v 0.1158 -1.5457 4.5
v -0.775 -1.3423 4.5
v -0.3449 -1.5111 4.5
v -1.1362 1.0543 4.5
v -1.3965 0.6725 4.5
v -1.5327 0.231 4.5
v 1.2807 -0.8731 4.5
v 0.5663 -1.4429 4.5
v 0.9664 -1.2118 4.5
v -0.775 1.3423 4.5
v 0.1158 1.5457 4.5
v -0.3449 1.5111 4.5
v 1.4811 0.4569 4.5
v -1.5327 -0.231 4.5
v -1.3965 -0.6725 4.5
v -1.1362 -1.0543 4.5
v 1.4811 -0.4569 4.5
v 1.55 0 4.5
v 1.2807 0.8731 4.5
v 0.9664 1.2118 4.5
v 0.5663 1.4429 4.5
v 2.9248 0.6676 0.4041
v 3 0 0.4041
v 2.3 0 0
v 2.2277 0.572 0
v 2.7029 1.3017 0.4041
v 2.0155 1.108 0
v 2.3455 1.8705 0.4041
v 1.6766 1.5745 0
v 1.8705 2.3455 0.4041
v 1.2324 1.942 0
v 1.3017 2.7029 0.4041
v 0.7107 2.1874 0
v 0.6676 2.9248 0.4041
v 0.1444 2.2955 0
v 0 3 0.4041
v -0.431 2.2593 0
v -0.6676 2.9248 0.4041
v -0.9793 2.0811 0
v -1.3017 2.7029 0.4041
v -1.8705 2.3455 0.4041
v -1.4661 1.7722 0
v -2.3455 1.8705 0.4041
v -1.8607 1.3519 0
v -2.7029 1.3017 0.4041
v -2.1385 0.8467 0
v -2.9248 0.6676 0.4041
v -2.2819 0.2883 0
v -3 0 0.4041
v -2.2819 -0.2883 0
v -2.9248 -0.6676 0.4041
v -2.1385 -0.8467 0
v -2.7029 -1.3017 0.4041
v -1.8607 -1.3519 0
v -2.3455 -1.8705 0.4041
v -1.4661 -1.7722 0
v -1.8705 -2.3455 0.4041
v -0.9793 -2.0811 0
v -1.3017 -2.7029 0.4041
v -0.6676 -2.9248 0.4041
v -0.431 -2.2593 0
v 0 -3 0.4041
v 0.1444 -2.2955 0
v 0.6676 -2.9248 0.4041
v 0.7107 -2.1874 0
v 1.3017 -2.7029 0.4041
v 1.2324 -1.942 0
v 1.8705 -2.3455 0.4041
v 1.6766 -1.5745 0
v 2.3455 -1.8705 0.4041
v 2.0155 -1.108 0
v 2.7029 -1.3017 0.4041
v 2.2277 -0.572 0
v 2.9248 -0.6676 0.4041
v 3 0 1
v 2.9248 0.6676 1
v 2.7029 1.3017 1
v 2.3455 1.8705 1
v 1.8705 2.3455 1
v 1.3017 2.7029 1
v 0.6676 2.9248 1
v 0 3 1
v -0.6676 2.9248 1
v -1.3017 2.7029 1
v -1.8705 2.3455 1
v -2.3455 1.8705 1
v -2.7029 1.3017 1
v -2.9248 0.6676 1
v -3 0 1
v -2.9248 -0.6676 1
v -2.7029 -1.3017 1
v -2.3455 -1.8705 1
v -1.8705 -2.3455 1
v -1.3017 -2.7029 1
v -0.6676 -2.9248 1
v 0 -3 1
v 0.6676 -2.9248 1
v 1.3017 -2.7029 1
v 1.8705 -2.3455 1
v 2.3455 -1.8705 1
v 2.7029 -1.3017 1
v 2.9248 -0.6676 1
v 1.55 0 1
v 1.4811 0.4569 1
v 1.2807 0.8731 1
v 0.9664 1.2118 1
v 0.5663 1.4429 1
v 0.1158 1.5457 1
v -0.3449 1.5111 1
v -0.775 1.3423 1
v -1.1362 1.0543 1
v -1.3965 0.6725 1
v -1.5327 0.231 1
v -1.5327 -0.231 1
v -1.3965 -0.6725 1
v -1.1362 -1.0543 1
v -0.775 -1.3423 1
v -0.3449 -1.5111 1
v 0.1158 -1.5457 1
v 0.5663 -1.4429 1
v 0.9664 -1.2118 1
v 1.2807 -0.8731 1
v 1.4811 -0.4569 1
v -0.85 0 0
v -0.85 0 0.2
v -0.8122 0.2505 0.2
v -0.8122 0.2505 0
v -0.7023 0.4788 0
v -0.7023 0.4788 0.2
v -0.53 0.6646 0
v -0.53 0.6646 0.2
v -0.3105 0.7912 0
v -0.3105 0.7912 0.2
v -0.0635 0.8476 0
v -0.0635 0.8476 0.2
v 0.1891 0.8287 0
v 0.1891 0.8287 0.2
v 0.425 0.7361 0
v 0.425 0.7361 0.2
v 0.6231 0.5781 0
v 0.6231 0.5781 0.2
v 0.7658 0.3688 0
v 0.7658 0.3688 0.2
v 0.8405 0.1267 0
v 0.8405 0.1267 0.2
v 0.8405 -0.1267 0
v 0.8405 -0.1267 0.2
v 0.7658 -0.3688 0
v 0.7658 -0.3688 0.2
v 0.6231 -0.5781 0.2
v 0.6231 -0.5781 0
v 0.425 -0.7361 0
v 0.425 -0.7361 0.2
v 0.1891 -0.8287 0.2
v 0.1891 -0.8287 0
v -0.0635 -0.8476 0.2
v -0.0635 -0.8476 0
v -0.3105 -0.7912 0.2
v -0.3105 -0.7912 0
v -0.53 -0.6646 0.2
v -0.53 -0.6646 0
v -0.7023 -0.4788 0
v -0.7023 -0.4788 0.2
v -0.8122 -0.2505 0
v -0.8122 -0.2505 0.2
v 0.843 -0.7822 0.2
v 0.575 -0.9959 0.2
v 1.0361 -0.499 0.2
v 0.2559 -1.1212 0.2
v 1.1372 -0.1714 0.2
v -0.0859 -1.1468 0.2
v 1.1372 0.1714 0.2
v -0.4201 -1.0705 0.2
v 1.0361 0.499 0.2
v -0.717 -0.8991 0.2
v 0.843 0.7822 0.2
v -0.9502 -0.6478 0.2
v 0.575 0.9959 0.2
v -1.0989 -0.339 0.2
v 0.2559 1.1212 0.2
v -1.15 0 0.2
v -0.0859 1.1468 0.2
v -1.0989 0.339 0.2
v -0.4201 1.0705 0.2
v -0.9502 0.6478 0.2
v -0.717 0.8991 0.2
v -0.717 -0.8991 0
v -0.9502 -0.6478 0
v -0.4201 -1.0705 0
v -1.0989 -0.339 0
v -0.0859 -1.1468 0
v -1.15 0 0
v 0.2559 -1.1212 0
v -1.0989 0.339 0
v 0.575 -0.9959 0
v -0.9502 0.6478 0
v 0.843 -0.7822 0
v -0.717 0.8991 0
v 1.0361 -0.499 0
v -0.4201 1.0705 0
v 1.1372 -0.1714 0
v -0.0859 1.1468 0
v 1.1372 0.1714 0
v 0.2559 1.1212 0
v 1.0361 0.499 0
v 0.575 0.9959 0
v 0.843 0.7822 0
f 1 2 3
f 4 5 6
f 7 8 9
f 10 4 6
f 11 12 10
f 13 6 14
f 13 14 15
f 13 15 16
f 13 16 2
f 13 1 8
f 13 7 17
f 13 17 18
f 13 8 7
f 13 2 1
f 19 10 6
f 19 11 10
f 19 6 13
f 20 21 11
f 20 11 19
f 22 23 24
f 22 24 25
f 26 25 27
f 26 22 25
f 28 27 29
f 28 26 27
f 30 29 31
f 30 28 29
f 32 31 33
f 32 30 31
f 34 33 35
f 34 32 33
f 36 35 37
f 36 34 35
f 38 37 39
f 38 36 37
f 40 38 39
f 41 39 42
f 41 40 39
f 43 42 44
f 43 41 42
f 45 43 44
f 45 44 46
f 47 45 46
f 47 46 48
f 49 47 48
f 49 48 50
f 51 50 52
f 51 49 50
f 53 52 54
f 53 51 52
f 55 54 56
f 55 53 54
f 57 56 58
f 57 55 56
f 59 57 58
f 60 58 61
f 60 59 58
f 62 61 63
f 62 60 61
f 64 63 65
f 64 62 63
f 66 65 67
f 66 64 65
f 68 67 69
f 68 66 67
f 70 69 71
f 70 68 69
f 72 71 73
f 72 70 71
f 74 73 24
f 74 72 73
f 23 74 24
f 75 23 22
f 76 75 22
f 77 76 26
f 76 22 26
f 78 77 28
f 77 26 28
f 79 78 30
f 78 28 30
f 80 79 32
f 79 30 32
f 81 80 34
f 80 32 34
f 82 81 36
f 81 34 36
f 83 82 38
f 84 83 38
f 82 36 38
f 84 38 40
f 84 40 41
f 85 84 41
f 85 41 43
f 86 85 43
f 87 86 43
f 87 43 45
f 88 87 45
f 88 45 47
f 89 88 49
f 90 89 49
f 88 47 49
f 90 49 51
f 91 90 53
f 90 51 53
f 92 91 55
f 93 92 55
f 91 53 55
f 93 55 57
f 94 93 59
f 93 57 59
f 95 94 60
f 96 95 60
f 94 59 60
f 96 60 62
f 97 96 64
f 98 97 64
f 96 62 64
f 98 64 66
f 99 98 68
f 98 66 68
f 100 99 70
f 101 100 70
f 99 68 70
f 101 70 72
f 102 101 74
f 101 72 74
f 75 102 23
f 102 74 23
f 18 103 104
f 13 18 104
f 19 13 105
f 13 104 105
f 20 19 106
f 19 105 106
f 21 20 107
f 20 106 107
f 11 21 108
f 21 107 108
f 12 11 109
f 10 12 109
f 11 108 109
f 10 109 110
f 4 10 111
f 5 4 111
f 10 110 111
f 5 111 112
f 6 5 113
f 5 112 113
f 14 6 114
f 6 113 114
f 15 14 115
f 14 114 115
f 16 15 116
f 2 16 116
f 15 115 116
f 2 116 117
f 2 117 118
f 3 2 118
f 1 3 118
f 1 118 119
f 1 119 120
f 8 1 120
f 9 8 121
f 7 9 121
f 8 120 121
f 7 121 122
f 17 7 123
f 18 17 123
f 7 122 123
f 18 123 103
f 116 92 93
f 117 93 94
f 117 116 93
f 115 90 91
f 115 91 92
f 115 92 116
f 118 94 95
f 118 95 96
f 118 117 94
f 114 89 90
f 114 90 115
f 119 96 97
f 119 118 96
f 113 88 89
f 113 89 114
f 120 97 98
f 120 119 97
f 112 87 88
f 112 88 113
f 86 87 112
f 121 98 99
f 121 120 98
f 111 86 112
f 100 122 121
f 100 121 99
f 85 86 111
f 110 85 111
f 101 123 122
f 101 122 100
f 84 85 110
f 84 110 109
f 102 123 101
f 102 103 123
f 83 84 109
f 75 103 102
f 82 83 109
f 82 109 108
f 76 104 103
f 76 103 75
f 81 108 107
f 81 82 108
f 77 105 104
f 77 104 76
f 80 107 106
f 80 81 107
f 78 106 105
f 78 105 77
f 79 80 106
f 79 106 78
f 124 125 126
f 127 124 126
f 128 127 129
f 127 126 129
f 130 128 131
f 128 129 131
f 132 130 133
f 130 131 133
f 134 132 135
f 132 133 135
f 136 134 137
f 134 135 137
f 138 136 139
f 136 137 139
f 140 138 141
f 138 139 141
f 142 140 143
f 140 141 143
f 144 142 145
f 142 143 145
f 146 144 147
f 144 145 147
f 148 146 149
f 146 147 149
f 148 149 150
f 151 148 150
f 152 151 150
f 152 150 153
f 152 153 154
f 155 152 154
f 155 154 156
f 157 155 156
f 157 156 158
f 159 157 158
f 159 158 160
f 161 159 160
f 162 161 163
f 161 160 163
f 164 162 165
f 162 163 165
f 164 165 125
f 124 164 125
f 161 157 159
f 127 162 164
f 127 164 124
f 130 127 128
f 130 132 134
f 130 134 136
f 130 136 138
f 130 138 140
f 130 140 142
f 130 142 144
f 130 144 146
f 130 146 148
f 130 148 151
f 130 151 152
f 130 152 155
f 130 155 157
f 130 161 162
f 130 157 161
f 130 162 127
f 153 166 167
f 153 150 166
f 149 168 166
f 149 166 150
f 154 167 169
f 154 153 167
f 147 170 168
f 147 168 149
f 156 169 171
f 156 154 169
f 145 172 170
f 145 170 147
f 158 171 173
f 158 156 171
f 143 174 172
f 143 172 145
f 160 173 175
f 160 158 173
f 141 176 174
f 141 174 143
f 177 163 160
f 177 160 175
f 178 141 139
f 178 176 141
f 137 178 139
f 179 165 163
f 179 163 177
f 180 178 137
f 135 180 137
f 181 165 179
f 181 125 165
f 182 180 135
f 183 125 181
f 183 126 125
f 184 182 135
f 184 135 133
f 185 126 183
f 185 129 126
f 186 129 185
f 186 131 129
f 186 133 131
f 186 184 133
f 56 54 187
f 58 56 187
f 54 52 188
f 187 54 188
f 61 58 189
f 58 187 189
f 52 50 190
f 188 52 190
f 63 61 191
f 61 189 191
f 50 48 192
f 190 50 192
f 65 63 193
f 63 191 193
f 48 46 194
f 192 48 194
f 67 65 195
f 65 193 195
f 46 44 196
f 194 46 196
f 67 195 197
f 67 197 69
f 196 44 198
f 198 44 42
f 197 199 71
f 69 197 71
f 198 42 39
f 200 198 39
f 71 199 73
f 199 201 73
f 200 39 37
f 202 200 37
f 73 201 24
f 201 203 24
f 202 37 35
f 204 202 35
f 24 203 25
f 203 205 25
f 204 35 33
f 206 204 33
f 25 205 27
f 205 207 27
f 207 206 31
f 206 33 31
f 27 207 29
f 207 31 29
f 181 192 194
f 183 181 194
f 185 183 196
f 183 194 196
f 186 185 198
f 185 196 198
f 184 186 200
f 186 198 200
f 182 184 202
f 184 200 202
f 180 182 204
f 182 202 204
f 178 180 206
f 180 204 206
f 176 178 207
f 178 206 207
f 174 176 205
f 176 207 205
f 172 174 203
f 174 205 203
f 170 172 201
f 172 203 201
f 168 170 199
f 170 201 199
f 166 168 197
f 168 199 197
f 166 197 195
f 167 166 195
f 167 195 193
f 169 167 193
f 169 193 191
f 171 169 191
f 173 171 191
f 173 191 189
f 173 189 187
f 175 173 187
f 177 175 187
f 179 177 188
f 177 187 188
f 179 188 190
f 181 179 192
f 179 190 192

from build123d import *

# Parameters (mm, degrees)
SKETCH1_R           = 3
BOSS_EXTRUDE1_DEPTH = 1
SKETCH2_R           = 1.55
BOSS_EXTRUDE2_DEPTH = 3.5
CHAMFER1_SIZE       = 0.7
CHAMFER1_SIZE2      = 0.404145188
SKETCH3_R           = 1.15
CUT_EXTRUDE1_DEPTH  = 0.2
SKETCH4_R           = 0.85
BOSS_EXTRUDE3_DEPTH = 0.2


with BuildPart() as part:
    # Sketch1 → Boss-Extrude1 (new body)
    with BuildSketch(Plane.XY):
        Circle(SKETCH1_R)
    extrude(amount=BOSS_EXTRUDE1_DEPTH)

    # Sketch2 → Boss-Extrude2 (add)
    with BuildSketch(Plane.XY.offset(1)):
        Circle(SKETCH2_R)
    extrude(amount=BOSS_EXTRUDE2_DEPTH)

    # Chamfer1
    chamfer1_edges = [part.edges().sort_by_distance(p)[0] for p in [
        (-3, 0, 0),
    ]]
    chamfer1_side = [part.faces().sort_by_distance(p)[0] for p in [
        (0, 0, 0),
    ]]
    chamfer(chamfer1_edges, length=CHAMFER1_SIZE, length2=CHAMFER1_SIZE2, reference=chamfer1_side[0])

    # Sketch3 → Cut-Extrude1 (cut)
    with BuildSketch(Plane(origin=(0, 0, 0), x_dir=(-1, 0, 0), z_dir=(0, 0, -1))):
        Circle(SKETCH3_R)
    extrude(amount=-CUT_EXTRUDE1_DEPTH, mode=Mode.SUBTRACT)

    # Sketch4 → Boss-Extrude3 (add)
    with BuildSketch(Plane(origin=(0, 0, 0.2), x_dir=(-1, 0, 0), z_dir=(0, 0, -1))):
        Circle(SKETCH4_R)
    extrude(amount=BOSS_EXTRUDE3_DEPTH)


solid = part.part
